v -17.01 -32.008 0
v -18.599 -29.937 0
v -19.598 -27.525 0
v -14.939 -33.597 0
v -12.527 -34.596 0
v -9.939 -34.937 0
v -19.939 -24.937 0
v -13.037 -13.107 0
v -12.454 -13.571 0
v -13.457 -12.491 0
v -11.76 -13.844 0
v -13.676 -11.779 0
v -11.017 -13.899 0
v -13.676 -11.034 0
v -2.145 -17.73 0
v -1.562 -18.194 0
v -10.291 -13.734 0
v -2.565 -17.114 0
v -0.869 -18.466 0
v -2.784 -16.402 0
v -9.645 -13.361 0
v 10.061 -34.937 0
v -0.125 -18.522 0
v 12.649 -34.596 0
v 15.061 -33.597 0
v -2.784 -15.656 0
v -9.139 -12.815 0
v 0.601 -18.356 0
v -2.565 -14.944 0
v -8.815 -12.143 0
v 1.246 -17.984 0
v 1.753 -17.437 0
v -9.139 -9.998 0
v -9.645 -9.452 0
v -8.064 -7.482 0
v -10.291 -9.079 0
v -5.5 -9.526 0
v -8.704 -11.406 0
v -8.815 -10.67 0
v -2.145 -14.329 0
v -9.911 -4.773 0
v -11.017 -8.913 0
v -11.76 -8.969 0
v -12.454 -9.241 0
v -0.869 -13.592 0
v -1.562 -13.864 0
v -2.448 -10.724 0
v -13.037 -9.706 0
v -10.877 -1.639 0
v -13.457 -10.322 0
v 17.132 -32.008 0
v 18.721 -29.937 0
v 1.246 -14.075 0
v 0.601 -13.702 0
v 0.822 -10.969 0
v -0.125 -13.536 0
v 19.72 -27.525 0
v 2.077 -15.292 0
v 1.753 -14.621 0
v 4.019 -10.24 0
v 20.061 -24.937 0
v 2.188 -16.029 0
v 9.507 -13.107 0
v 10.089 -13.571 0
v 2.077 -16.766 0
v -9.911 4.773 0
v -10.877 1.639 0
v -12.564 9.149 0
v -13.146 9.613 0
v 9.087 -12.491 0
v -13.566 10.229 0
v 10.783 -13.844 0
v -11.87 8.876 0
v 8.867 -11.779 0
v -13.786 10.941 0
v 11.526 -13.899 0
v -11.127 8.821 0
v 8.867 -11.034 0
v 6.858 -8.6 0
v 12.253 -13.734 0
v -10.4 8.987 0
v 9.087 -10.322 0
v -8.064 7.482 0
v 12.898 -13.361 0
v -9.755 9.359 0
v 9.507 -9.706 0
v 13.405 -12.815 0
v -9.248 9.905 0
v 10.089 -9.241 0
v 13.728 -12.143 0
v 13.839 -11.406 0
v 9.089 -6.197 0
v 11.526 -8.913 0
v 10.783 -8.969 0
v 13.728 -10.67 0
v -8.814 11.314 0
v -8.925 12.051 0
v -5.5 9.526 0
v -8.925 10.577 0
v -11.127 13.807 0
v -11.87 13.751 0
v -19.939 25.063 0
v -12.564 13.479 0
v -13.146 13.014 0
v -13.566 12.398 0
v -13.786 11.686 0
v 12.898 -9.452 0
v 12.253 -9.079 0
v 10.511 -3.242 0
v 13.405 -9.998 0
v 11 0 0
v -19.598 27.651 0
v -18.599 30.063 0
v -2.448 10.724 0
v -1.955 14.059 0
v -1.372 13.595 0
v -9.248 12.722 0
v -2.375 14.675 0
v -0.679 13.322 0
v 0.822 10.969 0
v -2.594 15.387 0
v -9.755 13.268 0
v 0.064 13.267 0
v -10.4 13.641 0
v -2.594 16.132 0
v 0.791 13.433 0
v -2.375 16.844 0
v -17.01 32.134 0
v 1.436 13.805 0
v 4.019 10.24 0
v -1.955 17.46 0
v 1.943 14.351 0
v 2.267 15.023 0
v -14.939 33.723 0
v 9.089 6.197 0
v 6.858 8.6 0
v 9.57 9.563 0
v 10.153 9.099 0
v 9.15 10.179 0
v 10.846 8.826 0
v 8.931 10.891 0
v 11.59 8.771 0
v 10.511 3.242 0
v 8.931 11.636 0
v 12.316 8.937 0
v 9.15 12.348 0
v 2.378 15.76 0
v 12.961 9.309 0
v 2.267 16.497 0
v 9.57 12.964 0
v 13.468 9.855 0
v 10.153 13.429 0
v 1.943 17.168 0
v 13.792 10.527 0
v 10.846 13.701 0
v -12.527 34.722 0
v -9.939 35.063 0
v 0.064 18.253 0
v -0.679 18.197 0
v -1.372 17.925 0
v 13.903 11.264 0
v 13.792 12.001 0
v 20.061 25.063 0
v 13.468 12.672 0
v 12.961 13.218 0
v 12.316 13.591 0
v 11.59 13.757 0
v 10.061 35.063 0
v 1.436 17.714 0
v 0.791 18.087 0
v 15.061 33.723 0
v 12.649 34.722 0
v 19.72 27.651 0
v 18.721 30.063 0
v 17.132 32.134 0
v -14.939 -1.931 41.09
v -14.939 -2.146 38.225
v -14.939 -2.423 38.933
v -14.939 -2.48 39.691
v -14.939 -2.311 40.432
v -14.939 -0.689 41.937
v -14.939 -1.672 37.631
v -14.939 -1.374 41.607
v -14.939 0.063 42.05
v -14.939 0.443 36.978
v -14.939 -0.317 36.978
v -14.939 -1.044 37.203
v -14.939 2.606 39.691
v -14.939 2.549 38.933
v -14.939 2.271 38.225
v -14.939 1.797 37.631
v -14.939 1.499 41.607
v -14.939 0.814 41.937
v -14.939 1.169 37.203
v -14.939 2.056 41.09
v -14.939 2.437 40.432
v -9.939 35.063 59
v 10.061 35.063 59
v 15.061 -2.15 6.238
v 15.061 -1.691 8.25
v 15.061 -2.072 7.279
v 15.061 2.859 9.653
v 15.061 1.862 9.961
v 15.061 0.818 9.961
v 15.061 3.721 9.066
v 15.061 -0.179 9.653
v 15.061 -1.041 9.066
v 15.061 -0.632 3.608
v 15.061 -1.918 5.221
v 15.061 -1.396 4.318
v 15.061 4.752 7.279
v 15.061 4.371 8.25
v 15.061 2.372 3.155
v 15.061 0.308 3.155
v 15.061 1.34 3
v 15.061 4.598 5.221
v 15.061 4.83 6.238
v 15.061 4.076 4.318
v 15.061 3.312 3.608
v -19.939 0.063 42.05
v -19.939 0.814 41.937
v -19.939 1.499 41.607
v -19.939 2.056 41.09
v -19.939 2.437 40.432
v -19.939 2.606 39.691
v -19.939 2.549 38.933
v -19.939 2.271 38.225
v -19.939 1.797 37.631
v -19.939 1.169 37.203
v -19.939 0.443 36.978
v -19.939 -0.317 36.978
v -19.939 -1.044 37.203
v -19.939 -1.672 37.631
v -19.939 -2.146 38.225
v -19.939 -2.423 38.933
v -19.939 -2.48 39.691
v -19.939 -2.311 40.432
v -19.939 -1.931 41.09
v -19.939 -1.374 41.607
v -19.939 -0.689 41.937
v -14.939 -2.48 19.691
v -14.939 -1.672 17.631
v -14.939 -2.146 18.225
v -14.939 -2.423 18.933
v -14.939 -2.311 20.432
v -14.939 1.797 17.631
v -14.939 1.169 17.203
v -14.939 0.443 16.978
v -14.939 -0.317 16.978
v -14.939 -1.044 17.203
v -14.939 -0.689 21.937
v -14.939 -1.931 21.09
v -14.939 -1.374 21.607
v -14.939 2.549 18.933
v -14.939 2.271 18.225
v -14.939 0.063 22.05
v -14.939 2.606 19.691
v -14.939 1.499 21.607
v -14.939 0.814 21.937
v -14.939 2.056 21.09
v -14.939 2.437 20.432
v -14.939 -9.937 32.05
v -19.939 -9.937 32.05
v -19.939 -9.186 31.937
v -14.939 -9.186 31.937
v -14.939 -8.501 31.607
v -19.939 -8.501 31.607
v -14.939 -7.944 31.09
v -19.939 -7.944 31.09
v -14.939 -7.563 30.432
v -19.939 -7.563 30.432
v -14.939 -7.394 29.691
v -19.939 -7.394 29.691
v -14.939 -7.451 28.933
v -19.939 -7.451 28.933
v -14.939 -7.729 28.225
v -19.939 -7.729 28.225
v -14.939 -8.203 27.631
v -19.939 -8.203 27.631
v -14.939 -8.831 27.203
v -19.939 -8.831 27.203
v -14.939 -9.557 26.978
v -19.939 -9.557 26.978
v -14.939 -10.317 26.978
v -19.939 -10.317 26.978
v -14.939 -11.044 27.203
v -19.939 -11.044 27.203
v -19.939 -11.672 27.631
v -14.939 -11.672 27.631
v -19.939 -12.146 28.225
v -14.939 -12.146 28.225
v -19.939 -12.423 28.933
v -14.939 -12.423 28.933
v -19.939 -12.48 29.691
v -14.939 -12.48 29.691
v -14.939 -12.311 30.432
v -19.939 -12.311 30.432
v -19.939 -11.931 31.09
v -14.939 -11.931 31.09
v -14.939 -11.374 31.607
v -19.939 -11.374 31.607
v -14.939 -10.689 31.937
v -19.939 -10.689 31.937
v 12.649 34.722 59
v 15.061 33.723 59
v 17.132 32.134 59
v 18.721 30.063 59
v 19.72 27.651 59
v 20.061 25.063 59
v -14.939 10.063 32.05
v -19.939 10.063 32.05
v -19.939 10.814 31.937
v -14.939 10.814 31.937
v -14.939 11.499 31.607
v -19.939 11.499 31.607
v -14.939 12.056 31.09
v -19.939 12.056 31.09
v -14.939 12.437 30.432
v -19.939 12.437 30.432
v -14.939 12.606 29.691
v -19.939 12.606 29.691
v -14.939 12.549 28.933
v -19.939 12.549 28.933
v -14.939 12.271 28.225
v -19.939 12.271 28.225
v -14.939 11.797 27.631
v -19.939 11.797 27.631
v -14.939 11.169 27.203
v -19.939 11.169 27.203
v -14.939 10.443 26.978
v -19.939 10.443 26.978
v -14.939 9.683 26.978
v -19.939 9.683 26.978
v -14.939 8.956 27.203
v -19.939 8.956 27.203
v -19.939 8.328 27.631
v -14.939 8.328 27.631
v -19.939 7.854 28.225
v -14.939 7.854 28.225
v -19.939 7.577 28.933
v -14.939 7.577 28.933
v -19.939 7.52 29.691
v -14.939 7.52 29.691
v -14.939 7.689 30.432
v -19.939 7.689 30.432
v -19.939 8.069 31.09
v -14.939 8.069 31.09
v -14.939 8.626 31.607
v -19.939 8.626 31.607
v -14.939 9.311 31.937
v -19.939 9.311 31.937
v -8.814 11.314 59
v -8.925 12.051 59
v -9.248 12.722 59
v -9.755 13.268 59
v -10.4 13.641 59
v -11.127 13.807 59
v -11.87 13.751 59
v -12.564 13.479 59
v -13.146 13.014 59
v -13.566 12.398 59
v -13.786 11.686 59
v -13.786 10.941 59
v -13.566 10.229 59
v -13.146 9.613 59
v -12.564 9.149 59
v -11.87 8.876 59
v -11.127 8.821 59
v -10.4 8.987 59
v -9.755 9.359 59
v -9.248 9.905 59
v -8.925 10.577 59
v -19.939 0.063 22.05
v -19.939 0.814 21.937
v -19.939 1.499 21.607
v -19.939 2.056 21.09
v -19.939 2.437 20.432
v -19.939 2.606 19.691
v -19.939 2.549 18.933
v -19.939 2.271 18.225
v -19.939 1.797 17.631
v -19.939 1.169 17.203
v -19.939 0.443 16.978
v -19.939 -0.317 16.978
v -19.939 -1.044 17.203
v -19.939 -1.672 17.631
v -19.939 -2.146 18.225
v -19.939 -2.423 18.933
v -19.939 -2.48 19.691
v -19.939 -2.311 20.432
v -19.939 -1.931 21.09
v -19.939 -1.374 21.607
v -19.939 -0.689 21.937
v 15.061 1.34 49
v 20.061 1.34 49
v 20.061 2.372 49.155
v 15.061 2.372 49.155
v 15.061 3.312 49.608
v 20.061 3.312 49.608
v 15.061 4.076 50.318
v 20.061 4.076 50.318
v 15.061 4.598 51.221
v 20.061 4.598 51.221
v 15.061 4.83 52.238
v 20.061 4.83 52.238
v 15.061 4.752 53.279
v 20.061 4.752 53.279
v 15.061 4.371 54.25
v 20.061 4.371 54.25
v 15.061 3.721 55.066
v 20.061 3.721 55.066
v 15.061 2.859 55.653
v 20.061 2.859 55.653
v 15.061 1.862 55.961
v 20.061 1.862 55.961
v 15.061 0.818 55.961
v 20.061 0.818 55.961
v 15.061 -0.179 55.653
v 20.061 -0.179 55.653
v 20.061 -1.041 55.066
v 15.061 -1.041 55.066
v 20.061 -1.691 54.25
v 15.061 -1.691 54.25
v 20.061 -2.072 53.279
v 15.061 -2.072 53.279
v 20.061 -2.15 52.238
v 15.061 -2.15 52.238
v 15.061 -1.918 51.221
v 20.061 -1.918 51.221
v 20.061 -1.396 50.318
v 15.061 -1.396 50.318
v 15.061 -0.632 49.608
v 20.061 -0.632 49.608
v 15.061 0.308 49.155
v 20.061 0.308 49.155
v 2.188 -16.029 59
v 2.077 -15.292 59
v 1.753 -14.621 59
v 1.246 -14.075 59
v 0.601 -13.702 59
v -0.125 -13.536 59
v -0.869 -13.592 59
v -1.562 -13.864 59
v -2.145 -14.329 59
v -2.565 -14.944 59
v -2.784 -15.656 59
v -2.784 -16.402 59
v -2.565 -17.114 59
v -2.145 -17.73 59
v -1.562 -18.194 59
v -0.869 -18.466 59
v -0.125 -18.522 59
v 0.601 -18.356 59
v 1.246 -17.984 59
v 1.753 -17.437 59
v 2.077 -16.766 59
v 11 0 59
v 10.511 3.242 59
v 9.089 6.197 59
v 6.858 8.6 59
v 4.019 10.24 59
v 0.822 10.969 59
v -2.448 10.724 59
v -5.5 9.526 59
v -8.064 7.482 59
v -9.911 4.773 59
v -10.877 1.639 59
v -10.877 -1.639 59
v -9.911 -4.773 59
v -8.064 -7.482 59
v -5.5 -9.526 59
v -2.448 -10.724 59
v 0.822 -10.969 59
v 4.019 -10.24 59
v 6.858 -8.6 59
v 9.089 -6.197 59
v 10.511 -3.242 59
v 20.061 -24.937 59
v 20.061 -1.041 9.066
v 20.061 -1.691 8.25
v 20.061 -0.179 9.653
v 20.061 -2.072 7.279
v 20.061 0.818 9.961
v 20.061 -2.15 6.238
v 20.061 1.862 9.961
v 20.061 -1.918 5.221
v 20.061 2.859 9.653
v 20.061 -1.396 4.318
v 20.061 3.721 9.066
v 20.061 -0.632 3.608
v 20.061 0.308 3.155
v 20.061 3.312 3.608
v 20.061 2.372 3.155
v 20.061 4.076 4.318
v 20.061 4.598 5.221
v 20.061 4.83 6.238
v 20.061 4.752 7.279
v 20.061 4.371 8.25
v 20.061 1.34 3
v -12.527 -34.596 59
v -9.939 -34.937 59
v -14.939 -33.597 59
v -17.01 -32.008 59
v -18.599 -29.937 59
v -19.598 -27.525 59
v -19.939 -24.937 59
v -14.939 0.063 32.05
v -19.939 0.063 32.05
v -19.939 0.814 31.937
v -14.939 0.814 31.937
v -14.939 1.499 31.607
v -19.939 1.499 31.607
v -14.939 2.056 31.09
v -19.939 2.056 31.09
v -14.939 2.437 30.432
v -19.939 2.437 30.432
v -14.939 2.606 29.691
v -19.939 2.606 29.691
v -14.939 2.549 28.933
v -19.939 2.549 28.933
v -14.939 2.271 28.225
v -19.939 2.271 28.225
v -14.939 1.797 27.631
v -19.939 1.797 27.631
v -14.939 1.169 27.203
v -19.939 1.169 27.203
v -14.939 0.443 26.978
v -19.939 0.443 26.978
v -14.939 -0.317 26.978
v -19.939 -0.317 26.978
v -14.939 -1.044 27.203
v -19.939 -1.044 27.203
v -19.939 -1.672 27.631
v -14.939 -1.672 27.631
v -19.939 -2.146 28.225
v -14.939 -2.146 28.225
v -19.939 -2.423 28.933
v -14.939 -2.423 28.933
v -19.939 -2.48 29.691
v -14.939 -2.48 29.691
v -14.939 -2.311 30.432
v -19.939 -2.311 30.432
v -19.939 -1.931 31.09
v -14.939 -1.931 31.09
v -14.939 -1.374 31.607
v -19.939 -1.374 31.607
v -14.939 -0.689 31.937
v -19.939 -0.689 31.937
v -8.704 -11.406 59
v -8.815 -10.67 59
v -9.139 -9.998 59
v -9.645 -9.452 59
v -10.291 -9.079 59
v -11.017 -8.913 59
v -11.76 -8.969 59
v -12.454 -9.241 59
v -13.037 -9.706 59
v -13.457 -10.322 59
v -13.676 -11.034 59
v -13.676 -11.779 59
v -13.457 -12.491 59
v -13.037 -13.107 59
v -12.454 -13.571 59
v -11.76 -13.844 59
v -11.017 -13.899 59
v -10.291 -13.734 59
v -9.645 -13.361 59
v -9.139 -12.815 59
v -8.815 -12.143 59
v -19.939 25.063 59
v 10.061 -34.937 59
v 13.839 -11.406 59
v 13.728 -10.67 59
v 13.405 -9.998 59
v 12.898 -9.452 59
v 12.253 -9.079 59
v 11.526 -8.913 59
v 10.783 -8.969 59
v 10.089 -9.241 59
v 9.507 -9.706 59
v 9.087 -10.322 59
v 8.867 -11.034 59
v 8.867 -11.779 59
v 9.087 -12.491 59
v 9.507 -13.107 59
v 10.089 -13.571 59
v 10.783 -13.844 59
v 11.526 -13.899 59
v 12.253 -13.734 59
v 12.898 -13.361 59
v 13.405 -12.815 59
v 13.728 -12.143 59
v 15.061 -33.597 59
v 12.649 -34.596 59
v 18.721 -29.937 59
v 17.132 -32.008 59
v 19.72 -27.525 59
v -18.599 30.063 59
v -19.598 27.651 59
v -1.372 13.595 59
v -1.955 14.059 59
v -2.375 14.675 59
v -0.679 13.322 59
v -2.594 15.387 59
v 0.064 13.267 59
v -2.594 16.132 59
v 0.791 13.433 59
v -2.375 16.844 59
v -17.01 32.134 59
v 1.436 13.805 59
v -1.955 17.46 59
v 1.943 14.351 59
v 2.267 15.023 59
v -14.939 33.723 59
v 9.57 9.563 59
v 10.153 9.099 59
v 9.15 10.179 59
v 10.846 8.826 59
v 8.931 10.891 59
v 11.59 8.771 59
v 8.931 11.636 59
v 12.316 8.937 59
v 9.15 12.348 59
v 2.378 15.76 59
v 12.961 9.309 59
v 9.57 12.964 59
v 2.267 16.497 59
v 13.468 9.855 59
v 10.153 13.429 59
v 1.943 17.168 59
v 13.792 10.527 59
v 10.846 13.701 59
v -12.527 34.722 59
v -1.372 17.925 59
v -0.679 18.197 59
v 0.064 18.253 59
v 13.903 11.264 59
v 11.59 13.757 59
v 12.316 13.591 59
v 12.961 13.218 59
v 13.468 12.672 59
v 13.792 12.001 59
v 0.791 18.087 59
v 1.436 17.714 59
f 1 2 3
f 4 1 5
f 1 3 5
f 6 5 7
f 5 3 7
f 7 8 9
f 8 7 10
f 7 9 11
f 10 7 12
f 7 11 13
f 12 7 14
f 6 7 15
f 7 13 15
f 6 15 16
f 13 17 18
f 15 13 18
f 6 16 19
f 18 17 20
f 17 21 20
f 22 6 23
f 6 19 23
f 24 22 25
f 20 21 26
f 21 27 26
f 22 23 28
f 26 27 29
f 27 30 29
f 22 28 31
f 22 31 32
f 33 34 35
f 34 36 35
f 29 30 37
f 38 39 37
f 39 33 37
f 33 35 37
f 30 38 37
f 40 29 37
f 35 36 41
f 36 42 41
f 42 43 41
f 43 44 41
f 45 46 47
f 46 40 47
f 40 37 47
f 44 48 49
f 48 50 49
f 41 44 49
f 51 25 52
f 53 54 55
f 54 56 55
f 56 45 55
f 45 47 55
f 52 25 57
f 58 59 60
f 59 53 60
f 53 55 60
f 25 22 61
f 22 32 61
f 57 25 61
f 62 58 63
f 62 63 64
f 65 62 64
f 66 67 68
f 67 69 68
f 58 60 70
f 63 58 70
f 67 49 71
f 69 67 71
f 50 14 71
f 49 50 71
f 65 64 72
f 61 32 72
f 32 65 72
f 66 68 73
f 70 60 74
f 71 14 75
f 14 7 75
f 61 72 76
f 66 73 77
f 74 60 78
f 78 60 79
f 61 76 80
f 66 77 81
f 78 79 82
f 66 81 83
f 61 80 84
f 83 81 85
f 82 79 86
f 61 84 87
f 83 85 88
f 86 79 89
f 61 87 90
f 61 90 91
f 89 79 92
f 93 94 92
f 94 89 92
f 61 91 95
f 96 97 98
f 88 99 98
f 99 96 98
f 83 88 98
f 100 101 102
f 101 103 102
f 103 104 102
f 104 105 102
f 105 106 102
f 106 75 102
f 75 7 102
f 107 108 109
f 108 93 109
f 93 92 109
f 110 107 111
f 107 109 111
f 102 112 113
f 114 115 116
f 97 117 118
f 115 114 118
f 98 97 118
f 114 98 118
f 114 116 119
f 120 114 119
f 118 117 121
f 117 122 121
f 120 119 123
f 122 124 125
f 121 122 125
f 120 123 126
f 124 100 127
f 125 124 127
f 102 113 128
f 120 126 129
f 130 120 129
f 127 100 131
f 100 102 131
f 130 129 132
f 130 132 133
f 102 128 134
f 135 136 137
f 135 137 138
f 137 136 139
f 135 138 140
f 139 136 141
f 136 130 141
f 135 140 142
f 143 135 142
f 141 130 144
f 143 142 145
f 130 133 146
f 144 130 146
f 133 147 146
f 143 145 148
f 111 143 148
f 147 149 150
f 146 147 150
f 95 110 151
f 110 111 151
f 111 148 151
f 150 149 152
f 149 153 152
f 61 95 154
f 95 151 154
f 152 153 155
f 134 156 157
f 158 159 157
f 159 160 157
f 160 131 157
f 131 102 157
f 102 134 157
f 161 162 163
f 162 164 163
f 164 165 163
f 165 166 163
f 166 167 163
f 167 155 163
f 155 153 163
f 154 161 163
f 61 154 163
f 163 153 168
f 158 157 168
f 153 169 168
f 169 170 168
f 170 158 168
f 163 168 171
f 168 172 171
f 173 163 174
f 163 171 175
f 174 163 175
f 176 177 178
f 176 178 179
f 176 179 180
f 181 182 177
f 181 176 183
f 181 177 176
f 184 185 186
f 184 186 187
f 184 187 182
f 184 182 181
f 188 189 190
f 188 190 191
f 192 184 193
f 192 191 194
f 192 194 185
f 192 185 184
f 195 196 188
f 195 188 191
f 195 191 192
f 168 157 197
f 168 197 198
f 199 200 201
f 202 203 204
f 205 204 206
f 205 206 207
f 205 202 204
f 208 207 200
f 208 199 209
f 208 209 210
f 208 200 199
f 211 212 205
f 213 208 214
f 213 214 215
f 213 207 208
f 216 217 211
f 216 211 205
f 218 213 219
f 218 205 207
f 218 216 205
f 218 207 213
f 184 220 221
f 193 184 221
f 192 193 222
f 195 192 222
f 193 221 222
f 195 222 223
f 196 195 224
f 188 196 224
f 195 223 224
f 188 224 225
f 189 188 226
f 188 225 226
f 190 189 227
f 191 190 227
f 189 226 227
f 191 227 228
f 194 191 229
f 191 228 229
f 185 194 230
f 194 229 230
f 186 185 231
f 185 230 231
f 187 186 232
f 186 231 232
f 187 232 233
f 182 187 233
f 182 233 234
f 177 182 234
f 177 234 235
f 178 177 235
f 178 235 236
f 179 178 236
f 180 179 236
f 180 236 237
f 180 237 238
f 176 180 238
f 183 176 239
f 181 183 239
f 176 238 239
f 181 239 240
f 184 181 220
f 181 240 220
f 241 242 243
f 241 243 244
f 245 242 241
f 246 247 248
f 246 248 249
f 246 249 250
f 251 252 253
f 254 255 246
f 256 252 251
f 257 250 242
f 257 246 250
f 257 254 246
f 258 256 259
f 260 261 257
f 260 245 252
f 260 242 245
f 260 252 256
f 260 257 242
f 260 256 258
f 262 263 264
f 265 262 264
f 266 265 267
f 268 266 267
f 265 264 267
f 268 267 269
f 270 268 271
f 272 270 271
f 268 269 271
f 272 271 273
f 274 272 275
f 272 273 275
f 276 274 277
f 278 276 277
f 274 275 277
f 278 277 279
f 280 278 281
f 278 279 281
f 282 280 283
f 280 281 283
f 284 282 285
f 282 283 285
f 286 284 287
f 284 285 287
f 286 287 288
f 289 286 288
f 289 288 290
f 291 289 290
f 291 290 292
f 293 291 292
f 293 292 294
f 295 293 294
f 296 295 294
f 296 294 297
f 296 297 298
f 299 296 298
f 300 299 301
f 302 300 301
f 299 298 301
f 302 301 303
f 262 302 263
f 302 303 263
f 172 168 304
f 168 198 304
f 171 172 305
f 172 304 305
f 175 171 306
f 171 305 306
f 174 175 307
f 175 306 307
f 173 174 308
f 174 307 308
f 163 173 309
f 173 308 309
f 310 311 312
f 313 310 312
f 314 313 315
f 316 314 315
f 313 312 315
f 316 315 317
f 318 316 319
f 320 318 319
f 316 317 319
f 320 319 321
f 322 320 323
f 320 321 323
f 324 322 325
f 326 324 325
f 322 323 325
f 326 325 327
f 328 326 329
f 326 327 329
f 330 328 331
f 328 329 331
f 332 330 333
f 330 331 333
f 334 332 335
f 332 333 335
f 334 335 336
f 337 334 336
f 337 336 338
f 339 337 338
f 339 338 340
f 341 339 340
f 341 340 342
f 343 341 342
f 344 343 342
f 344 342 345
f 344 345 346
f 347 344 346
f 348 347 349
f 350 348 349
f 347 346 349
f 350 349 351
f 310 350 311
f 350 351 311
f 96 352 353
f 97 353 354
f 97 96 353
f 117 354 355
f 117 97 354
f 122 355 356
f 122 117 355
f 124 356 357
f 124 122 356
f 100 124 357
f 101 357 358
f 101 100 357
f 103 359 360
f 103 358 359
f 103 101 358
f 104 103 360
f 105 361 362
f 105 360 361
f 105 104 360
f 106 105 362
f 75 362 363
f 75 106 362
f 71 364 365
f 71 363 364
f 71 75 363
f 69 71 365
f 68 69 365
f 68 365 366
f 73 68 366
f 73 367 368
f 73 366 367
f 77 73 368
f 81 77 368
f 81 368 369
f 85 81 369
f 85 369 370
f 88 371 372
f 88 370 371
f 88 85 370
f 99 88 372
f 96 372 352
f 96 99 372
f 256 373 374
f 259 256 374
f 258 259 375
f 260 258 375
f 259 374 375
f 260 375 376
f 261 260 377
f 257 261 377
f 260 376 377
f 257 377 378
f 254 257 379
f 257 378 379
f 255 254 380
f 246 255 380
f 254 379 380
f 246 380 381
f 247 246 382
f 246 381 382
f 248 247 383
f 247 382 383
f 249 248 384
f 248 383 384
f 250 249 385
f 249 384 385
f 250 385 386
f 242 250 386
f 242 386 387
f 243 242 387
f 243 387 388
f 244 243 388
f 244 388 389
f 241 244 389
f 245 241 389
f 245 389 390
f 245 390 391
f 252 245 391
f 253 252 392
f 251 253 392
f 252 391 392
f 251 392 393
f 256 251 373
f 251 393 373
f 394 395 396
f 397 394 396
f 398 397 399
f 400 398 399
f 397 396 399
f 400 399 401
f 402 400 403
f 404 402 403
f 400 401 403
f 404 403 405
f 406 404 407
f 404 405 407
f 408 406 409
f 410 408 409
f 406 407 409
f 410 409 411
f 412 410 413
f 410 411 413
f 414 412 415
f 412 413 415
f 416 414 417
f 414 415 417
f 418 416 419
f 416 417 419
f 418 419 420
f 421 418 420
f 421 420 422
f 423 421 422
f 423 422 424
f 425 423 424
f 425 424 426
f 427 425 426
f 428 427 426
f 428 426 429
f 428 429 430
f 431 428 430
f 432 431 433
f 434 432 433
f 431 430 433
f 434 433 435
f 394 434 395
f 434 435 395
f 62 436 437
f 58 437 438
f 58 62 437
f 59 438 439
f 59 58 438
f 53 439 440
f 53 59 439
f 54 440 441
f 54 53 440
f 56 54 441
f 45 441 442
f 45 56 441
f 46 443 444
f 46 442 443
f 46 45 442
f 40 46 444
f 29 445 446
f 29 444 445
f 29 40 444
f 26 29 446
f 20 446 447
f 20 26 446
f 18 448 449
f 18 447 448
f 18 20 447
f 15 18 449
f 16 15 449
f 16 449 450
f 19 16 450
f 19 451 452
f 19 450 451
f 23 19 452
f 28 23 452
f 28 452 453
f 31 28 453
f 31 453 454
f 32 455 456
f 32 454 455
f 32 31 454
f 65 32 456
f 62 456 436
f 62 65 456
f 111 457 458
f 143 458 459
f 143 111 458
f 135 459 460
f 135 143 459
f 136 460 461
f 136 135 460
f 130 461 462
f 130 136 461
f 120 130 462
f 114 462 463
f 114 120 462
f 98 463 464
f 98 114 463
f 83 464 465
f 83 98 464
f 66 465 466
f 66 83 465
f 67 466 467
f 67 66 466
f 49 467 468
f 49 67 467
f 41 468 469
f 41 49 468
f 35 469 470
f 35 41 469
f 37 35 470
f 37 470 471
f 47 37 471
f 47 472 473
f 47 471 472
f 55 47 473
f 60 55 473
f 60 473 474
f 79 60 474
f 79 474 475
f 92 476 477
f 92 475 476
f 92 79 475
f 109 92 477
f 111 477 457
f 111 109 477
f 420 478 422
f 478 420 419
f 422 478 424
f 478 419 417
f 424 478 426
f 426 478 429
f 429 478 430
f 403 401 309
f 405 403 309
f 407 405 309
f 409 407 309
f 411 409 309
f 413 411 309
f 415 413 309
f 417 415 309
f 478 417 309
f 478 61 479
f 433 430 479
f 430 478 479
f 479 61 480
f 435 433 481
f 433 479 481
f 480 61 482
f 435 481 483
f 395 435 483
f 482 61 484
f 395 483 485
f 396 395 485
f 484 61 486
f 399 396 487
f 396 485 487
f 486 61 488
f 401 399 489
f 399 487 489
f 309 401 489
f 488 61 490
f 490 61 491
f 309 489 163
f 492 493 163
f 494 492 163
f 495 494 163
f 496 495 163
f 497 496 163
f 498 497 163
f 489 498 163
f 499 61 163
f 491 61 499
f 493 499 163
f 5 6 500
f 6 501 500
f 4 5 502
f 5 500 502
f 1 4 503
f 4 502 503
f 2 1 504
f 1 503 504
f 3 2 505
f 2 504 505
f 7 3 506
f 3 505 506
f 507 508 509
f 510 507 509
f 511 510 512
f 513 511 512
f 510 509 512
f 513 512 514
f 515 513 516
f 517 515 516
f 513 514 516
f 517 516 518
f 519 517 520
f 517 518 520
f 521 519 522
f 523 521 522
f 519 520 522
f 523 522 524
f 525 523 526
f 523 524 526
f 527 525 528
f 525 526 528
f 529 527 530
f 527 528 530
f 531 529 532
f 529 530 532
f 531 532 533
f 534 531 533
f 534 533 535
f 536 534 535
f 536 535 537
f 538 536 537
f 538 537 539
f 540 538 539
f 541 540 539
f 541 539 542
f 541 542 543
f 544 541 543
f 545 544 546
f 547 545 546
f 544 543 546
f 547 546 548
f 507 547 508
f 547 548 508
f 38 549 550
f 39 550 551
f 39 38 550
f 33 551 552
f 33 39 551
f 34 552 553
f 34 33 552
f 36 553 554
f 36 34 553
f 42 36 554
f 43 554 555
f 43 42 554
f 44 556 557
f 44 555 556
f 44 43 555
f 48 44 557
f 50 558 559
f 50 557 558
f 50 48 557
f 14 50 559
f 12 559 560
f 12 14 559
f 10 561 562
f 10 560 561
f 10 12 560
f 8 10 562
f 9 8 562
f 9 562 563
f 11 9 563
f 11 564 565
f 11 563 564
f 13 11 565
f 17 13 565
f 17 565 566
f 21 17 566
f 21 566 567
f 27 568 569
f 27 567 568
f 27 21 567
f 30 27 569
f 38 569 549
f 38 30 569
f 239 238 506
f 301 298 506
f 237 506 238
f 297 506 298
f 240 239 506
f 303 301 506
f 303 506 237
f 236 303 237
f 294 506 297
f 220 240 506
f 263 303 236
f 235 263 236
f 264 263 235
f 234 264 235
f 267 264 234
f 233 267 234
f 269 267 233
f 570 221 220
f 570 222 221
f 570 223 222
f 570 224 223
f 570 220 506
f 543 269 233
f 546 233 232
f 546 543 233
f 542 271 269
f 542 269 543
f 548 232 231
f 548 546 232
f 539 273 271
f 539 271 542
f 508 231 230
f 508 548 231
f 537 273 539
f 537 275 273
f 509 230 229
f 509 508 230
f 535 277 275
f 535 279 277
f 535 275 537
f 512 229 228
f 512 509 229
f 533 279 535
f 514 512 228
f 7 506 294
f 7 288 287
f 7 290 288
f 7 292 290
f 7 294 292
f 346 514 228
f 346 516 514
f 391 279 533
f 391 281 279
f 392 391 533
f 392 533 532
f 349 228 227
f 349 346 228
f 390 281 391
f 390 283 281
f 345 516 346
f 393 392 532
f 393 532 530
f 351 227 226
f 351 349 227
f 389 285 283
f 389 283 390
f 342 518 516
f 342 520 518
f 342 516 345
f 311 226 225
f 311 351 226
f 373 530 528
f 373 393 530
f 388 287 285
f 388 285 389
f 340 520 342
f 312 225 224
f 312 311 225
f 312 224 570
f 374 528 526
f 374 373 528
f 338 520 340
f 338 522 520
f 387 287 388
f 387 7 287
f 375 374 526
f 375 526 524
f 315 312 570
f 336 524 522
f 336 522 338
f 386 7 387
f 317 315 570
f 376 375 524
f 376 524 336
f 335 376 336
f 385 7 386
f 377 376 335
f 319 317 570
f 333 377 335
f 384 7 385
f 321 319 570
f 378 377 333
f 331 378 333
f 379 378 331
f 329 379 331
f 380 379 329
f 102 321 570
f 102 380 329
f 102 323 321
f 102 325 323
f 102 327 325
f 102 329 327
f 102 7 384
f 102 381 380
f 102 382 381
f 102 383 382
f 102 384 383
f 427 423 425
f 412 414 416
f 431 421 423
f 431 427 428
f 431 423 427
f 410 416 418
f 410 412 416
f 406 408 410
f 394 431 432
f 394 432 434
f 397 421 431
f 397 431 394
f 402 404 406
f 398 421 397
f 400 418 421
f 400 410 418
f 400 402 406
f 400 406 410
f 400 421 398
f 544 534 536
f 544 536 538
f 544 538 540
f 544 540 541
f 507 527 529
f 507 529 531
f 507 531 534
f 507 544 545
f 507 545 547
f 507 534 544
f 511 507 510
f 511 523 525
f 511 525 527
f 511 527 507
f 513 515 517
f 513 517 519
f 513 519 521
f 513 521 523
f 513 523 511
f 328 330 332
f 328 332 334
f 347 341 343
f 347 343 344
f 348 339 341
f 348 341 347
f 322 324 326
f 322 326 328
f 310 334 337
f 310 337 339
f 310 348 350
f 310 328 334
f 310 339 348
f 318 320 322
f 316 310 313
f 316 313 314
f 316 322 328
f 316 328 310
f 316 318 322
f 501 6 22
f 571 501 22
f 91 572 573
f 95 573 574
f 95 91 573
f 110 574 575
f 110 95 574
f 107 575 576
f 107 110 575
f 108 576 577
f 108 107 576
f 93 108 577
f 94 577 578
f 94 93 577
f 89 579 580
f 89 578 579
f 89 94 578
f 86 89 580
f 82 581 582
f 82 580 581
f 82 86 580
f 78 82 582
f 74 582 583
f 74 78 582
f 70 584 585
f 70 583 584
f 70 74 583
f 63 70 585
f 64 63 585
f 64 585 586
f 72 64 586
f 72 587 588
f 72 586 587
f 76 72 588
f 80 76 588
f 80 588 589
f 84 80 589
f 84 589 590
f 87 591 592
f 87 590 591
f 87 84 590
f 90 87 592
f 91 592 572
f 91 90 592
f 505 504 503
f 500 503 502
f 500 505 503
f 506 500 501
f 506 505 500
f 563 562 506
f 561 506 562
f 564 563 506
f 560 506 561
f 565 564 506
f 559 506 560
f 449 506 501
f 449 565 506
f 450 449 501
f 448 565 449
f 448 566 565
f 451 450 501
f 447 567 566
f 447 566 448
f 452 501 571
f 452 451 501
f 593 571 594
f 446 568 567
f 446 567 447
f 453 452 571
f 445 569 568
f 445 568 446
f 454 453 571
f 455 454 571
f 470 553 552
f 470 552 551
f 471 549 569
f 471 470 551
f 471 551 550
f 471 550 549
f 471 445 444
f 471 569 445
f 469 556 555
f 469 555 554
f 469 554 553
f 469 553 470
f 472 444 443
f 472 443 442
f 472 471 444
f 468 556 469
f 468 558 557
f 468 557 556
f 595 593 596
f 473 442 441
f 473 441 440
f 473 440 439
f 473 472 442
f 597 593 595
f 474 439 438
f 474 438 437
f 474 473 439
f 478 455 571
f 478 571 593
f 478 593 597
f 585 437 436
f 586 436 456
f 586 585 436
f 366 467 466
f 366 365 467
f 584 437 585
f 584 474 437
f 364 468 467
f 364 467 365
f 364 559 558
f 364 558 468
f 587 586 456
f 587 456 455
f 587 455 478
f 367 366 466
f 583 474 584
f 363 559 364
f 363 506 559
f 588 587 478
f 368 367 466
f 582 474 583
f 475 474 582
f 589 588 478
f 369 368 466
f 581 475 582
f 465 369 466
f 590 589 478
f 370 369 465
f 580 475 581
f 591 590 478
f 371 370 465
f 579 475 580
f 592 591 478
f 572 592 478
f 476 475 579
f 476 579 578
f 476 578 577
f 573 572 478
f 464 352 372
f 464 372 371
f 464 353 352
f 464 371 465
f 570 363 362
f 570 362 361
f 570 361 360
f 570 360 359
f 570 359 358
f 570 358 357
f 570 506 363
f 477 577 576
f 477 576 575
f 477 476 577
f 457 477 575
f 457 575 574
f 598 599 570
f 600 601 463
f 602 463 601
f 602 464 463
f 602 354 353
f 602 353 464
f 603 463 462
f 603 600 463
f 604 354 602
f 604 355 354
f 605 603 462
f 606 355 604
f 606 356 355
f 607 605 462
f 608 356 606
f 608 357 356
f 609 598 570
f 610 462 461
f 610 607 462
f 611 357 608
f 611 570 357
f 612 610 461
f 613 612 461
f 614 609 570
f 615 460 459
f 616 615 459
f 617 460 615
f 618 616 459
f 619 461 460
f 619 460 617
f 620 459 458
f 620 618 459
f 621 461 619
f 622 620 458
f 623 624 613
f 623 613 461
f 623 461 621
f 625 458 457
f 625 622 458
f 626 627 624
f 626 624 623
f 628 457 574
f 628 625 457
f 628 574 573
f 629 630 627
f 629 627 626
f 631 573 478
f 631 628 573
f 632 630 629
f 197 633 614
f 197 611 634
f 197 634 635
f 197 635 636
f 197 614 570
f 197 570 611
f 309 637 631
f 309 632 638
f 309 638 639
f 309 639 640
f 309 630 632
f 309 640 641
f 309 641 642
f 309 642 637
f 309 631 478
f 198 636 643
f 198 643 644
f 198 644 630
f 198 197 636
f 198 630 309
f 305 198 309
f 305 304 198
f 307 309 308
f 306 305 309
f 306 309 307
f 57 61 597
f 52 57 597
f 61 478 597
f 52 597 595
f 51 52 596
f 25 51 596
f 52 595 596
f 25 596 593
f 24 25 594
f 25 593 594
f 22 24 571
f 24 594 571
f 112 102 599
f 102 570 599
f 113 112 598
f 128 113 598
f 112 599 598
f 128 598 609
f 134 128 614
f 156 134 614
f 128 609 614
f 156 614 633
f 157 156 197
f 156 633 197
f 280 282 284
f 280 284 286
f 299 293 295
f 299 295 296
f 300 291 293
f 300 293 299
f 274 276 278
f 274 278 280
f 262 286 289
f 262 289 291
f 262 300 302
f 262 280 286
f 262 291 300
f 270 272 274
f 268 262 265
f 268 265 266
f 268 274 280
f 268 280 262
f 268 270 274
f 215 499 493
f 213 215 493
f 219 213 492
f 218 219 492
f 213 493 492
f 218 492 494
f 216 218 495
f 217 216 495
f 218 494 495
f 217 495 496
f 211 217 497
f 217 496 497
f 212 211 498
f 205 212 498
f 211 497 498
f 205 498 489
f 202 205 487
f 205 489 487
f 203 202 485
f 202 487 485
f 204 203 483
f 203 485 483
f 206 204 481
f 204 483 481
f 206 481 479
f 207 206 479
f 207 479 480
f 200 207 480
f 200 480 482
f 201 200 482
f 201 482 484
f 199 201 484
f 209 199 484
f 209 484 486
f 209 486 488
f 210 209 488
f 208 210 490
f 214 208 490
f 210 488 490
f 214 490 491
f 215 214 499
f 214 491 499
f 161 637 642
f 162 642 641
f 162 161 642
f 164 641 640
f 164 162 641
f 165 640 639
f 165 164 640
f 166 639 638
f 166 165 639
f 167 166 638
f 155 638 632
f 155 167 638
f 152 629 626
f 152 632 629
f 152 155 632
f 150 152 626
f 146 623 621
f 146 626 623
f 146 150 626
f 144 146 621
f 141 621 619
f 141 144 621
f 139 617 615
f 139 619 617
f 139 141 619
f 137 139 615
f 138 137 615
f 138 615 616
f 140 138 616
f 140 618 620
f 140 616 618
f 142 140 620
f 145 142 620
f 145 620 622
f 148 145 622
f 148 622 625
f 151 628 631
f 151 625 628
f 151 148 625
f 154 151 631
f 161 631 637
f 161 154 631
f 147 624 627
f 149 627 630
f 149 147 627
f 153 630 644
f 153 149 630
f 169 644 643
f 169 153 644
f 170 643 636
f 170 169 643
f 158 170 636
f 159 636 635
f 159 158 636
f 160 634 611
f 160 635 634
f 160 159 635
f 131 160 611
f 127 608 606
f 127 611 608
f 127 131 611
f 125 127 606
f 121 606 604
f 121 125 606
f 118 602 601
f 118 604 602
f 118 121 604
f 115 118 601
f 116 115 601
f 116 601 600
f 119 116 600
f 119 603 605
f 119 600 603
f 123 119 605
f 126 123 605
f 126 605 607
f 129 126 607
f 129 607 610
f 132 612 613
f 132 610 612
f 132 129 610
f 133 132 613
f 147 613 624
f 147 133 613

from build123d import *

# Parameters (mm, degrees)
SKETCH1_W           = 40
SKETCH1_H           = 70
BOSS_EXTRUDE1_DEPTH = 59
SKETCH2_R           = 11
SKETCH2_R_2         = 2.5
CUT_EXTRUDE1_DEPTH  = 72.504101247
SKETCH5_R           = 2.55
CUT_EXTRUDE3_DEPTH  = 5
FILLET1_R           = 10
FILLET2_R           = 10
FILLET3_R           = 10
FILLET4_R           = 10
CUT_EXTRUDE4_START  = 20.060831
SKETCH10_R          = 3.5
CUT_EXTRUDE4_DEPTH  = 5


with BuildPart() as part:
    # Sketch1 → Boss-Extrude1 (new body)
    with BuildSketch(Plane.XY):
        with Locations((0.060830656, 0.062794648)):
            Rectangle(SKETCH1_W, SKETCH1_H)
    extrude(amount=BOSS_EXTRUDE1_DEPTH)

    # Sketch2 → Cut-Extrude1 (cut, through all)
    with BuildSketch(Plane.XY):
        Circle(SKETCH2_R)
        with Locations((-11.313708499, 11.313708499)):
            Circle(SKETCH2_R_2)
        with Locations((-0.122338904, 15.759725587)):
            Circle(SKETCH2_R_2)
        with Locations((11.402693442, 11.263696484)):
            Circle(SKETCH2_R_2)
        with Locations((11.339369089, -11.406422087)):
            Circle(SKETCH2_R_2)
        with Locations((-0.312311964, -16.029099896)):
            Circle(SKETCH2_R_2)
        with Locations((-11.204100775, -11.406422087)):
            Circle(SKETCH2_R_2)
    extrude(amount=CUT_EXTRUDE1_DEPTH, mode=Mode.SUBTRACT)

    # Sketch5 → Cut-Extrude3 (cut)
    with BuildSketch(Plane.ZY.offset(19.939169344)):
        with Locations((29.5, 0.062794648)):
            Circle(SKETCH5_R)
        with Locations((39.5, 0.062794648)):
            Circle(SKETCH5_R)
        with Locations((19.5, 0.062794648)):
            Circle(SKETCH5_R)
        with Locations((29.5, 10.062794648)):
            Circle(SKETCH5_R)
        with Locations((29.5, -9.937205352)):
            Circle(SKETCH5_R)
    extrude(amount=-CUT_EXTRUDE3_DEPTH, mode=Mode.SUBTRACT)

    # Fillet1
    fillet1_edges = [part.edges().sort_by_distance(p)[0] for p in [
        (20.060830656, 35.062794648, 29.5),
    ]]
    fillet(fillet1_edges, radius=FILLET1_R)

    # Fillet2
    fillet2_edges = [part.edges().sort_by_distance(p)[0] for p in [
        (20.060830656, -34.937205352, 29.5),
    ]]
    fillet(fillet2_edges, radius=FILLET2_R)

    # Fillet3
    fillet3_edges = [part.edges().sort_by_distance(p)[0] for p in [
        (-19.939169344, -34.937205352, 29.5),
    ]]
    fillet(fillet3_edges, radius=FILLET3_R)

    # Fillet4
    fillet4_edges = [part.edges().sort_by_distance(p)[0] for p in [
        (-19.939169344, 35.062794648, 29.5),
    ]]
    fillet(fillet4_edges, radius=FILLET4_R)

    # Sketch10 → Cut-Extrude4 (cut)
    with BuildSketch(Plane(origin=(0, 0, 0), x_dir=(0, 0, -1), z_dir=(1, 0, 0)).offset(CUT_EXTRUDE4_START)):
        with Locations((-52.5, 1.34000523)):
            Circle(SKETCH10_R)
        with Locations((-6.5, 1.34000523)):
            Circle(SKETCH10_R)
    extrude(amount=-CUT_EXTRUDE4_DEPTH, mode=Mode.SUBTRACT)


solid = part.part
